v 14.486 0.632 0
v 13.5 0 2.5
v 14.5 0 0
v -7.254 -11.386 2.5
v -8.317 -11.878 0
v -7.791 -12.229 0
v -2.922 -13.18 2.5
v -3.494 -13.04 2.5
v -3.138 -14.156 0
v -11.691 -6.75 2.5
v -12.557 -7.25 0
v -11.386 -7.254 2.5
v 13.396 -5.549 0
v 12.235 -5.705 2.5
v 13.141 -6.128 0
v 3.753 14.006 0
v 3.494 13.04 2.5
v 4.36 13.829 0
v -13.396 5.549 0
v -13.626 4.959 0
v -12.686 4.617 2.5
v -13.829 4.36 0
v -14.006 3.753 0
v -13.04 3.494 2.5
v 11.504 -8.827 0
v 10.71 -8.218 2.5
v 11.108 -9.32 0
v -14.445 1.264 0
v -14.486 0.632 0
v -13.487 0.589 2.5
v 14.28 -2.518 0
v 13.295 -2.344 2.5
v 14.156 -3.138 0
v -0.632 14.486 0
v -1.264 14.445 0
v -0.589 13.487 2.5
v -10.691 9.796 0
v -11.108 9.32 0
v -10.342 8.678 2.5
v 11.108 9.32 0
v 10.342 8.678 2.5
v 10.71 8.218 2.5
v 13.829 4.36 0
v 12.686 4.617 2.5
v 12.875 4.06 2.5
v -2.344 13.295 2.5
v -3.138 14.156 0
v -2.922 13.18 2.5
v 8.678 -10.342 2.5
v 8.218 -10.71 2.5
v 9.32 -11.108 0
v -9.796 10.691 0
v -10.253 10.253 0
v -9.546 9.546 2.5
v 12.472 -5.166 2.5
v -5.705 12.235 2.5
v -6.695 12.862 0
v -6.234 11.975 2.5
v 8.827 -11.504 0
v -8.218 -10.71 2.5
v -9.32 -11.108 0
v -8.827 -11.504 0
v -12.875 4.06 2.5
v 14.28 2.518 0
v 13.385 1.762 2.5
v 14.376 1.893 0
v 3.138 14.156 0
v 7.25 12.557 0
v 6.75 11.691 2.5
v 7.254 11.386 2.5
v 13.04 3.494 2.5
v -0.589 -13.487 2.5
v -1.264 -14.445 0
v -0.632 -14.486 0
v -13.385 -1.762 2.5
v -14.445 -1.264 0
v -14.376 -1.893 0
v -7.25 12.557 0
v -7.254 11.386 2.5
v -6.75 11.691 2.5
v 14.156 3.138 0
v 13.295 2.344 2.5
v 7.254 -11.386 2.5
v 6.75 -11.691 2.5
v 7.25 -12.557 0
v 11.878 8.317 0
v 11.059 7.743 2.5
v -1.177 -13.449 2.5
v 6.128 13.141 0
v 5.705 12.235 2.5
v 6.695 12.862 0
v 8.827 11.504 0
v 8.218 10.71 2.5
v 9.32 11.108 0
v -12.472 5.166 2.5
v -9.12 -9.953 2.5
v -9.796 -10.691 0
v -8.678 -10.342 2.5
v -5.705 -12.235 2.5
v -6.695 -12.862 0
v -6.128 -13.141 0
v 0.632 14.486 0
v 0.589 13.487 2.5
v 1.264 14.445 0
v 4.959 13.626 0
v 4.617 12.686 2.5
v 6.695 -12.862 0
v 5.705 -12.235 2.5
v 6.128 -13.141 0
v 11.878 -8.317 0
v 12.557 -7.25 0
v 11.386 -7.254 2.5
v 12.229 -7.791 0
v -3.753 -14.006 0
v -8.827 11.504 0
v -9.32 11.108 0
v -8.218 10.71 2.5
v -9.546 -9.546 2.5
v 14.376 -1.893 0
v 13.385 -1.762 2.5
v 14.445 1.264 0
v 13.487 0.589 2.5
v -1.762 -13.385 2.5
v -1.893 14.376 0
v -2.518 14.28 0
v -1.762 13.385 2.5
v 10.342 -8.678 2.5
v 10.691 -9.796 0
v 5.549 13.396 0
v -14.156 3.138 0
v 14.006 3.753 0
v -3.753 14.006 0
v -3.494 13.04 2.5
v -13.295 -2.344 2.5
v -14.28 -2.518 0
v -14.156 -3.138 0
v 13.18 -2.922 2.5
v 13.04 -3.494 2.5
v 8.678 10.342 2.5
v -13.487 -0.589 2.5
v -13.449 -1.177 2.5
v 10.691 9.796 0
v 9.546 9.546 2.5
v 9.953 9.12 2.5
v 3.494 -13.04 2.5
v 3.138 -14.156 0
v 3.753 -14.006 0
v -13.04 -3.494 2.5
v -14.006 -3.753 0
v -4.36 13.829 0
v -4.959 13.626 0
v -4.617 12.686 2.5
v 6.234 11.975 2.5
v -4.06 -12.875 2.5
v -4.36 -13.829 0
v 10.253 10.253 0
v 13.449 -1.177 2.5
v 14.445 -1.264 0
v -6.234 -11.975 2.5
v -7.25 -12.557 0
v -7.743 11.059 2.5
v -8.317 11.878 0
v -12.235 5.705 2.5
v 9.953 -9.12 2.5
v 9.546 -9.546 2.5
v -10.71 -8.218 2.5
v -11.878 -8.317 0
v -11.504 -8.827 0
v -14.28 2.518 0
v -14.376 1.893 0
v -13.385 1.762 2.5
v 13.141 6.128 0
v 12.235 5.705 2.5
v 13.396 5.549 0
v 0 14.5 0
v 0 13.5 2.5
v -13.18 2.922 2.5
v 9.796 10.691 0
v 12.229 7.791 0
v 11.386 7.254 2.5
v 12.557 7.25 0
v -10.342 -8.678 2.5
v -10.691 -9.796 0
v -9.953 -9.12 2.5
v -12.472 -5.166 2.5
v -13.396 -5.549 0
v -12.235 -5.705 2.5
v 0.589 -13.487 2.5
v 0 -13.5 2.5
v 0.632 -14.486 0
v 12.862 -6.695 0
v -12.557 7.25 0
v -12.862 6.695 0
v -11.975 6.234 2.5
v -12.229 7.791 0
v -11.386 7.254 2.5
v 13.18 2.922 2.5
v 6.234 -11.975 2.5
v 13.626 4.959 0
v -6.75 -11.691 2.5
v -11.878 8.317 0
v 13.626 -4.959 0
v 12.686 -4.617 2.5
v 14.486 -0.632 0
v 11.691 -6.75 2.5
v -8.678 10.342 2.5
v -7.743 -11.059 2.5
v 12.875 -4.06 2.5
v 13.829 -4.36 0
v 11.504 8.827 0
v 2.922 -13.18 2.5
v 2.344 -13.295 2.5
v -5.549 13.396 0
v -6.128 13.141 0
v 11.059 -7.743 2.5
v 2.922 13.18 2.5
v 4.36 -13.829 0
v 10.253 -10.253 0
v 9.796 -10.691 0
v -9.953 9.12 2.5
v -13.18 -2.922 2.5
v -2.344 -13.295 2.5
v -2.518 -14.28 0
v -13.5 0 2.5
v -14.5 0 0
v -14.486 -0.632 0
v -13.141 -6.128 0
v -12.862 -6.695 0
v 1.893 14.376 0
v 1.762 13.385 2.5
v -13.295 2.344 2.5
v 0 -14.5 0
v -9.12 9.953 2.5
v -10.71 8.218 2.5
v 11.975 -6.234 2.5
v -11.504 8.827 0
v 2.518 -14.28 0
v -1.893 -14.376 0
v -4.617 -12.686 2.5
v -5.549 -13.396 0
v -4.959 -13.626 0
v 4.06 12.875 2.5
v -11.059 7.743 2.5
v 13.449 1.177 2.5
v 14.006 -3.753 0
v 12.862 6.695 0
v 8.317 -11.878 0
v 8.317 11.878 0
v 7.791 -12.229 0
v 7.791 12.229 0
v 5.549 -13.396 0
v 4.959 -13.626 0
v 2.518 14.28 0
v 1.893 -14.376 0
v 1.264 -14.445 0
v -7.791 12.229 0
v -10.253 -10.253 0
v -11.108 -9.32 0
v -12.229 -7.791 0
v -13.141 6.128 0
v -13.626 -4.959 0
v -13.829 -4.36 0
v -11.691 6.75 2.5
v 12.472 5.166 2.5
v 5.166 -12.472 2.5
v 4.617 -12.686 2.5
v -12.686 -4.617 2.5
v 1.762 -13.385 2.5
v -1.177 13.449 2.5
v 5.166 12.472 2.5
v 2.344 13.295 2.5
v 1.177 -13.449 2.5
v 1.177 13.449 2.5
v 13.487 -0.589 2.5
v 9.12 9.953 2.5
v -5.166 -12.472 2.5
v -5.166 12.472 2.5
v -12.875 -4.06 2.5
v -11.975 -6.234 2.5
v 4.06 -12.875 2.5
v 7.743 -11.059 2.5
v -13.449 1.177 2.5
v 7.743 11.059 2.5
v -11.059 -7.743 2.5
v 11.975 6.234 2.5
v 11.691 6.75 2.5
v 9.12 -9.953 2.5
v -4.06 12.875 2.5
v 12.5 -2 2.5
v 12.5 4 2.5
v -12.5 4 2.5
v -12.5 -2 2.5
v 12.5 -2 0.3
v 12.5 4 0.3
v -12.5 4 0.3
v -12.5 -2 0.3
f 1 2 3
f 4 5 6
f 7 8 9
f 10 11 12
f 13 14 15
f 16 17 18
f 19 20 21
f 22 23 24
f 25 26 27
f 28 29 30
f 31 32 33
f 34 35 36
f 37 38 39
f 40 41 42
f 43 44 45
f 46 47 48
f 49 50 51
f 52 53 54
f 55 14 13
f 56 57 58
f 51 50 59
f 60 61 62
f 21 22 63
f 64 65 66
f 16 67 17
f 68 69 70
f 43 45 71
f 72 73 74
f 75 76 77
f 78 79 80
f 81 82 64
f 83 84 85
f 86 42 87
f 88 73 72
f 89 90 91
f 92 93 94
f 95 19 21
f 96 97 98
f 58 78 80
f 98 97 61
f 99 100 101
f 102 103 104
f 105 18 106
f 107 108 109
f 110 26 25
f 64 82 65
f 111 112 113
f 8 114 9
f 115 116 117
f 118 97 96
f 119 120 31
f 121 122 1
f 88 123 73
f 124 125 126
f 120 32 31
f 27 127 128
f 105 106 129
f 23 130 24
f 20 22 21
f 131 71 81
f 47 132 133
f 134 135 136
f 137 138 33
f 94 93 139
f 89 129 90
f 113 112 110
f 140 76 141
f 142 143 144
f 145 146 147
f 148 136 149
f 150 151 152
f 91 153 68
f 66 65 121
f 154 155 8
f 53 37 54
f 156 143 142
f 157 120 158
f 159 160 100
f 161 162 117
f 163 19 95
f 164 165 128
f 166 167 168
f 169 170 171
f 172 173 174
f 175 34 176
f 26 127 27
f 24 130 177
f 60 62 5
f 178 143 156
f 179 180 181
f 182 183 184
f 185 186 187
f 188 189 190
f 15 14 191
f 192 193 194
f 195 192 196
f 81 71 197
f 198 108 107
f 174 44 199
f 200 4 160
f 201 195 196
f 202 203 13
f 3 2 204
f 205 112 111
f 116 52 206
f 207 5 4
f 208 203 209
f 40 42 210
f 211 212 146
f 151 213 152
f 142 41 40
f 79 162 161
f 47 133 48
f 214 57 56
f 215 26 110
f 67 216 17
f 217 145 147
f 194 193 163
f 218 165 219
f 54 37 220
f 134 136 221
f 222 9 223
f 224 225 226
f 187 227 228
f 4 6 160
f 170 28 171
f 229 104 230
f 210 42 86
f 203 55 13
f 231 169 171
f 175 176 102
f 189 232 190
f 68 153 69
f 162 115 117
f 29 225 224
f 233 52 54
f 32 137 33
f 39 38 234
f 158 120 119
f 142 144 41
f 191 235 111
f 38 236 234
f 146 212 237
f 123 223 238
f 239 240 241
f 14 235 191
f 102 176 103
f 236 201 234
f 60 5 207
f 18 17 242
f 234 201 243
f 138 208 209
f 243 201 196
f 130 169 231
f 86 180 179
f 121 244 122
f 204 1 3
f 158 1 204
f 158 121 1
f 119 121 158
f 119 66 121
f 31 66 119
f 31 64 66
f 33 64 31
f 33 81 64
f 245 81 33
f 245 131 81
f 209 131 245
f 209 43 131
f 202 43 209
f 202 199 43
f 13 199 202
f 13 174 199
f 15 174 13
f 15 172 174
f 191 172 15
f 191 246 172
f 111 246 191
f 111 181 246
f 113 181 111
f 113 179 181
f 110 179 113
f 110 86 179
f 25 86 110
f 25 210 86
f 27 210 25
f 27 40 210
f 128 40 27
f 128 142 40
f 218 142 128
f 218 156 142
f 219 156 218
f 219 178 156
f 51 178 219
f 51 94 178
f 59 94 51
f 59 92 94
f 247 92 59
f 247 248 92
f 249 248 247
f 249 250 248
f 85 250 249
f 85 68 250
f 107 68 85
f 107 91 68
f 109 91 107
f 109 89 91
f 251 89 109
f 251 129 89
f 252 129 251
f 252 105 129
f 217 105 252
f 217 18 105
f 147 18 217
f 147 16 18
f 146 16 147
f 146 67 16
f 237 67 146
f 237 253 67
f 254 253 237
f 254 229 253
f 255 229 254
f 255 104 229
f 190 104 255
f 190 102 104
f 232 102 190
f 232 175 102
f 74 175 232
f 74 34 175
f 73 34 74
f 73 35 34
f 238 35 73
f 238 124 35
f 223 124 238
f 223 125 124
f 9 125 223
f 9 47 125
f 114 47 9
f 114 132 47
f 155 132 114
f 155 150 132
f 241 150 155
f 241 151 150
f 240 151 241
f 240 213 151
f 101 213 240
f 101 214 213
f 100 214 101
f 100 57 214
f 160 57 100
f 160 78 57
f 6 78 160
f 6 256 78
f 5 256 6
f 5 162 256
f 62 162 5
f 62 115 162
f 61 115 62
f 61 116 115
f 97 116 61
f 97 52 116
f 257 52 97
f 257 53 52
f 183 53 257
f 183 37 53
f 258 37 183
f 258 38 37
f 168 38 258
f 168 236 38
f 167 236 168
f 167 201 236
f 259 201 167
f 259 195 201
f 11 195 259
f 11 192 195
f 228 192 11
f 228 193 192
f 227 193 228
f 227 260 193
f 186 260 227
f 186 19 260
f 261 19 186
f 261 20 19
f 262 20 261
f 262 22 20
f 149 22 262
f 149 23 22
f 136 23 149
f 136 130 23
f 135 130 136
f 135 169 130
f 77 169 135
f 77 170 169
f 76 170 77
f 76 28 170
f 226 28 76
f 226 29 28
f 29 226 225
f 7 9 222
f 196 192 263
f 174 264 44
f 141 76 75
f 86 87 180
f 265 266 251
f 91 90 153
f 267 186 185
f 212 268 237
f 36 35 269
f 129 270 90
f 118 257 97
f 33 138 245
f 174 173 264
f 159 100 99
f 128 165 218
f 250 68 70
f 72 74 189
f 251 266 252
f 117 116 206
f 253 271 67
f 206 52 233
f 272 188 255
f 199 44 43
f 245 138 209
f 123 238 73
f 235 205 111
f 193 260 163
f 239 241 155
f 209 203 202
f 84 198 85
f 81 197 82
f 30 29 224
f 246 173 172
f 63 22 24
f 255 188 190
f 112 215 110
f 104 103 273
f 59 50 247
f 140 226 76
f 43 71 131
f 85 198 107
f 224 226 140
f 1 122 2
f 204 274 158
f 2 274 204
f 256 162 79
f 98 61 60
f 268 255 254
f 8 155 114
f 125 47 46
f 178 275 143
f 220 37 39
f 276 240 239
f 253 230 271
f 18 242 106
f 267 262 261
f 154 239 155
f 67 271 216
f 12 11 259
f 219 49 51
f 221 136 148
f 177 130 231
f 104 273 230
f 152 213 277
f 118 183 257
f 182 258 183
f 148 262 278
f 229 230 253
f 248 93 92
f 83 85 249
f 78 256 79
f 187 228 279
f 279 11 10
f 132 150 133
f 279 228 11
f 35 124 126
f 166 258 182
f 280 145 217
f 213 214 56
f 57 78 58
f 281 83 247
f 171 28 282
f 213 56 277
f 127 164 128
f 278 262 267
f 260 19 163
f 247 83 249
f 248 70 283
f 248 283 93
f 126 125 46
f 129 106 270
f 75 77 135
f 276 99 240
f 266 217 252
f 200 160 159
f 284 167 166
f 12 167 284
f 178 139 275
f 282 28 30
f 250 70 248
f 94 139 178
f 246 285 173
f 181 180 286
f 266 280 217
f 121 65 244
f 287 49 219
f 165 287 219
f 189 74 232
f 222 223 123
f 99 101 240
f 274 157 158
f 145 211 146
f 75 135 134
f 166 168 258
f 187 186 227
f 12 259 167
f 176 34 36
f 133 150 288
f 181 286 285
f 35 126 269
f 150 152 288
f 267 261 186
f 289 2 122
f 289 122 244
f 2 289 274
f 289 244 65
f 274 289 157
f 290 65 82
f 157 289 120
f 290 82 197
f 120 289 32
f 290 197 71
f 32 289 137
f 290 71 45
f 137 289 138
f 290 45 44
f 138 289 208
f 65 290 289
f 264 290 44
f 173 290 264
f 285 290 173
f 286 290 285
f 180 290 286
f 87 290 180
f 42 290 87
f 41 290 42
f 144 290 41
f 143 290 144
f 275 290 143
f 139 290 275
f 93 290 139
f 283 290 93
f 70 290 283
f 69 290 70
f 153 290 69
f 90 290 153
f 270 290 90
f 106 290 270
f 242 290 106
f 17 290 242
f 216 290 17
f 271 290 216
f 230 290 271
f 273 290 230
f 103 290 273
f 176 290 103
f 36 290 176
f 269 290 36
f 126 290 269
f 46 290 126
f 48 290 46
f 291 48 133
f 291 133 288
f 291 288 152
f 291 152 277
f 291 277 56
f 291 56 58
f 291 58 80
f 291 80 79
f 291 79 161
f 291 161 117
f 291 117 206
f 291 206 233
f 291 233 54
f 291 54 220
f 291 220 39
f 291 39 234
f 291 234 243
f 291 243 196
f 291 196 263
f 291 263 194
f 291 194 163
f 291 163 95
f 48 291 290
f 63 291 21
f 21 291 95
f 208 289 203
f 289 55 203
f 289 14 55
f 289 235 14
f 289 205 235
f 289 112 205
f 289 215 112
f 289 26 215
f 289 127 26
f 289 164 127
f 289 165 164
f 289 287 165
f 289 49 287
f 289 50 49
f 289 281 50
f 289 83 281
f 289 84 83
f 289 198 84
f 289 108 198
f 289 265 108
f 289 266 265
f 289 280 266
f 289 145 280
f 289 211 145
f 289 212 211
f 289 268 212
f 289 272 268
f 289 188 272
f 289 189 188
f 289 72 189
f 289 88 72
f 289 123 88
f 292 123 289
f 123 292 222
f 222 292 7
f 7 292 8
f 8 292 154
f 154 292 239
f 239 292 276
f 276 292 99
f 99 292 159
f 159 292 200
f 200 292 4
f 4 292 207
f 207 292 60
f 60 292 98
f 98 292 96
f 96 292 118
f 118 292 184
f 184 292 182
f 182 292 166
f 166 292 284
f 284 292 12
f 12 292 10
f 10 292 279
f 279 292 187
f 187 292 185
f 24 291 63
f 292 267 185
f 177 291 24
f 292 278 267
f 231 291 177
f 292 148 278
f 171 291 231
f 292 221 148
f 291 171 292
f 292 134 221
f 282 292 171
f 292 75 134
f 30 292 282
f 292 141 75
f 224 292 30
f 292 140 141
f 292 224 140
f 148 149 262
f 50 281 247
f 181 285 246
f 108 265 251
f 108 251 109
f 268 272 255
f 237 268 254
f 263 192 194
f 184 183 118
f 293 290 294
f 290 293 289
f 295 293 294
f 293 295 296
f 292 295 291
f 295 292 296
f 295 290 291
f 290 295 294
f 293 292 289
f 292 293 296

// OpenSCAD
fillDiameter = 29;
fillTaper = 2;
fillHeight = 2.5;
slotInset = 4;
slotWidth = 6;
slotHeight = 2 * fillHeight;
slotOffset = 1;
fillBaseHeight = 0.3;

difference() {
    cylinder(h=fillHeight, d1 = fillDiameter, d2 = fillDiameter - fillTaper, $fn=144);
    translate([0, slotOffset, fillBaseHeight + slotHeight / 2]) cube([fillDiameter - slotInset, slotWidth, slotHeight], center = true);
};
